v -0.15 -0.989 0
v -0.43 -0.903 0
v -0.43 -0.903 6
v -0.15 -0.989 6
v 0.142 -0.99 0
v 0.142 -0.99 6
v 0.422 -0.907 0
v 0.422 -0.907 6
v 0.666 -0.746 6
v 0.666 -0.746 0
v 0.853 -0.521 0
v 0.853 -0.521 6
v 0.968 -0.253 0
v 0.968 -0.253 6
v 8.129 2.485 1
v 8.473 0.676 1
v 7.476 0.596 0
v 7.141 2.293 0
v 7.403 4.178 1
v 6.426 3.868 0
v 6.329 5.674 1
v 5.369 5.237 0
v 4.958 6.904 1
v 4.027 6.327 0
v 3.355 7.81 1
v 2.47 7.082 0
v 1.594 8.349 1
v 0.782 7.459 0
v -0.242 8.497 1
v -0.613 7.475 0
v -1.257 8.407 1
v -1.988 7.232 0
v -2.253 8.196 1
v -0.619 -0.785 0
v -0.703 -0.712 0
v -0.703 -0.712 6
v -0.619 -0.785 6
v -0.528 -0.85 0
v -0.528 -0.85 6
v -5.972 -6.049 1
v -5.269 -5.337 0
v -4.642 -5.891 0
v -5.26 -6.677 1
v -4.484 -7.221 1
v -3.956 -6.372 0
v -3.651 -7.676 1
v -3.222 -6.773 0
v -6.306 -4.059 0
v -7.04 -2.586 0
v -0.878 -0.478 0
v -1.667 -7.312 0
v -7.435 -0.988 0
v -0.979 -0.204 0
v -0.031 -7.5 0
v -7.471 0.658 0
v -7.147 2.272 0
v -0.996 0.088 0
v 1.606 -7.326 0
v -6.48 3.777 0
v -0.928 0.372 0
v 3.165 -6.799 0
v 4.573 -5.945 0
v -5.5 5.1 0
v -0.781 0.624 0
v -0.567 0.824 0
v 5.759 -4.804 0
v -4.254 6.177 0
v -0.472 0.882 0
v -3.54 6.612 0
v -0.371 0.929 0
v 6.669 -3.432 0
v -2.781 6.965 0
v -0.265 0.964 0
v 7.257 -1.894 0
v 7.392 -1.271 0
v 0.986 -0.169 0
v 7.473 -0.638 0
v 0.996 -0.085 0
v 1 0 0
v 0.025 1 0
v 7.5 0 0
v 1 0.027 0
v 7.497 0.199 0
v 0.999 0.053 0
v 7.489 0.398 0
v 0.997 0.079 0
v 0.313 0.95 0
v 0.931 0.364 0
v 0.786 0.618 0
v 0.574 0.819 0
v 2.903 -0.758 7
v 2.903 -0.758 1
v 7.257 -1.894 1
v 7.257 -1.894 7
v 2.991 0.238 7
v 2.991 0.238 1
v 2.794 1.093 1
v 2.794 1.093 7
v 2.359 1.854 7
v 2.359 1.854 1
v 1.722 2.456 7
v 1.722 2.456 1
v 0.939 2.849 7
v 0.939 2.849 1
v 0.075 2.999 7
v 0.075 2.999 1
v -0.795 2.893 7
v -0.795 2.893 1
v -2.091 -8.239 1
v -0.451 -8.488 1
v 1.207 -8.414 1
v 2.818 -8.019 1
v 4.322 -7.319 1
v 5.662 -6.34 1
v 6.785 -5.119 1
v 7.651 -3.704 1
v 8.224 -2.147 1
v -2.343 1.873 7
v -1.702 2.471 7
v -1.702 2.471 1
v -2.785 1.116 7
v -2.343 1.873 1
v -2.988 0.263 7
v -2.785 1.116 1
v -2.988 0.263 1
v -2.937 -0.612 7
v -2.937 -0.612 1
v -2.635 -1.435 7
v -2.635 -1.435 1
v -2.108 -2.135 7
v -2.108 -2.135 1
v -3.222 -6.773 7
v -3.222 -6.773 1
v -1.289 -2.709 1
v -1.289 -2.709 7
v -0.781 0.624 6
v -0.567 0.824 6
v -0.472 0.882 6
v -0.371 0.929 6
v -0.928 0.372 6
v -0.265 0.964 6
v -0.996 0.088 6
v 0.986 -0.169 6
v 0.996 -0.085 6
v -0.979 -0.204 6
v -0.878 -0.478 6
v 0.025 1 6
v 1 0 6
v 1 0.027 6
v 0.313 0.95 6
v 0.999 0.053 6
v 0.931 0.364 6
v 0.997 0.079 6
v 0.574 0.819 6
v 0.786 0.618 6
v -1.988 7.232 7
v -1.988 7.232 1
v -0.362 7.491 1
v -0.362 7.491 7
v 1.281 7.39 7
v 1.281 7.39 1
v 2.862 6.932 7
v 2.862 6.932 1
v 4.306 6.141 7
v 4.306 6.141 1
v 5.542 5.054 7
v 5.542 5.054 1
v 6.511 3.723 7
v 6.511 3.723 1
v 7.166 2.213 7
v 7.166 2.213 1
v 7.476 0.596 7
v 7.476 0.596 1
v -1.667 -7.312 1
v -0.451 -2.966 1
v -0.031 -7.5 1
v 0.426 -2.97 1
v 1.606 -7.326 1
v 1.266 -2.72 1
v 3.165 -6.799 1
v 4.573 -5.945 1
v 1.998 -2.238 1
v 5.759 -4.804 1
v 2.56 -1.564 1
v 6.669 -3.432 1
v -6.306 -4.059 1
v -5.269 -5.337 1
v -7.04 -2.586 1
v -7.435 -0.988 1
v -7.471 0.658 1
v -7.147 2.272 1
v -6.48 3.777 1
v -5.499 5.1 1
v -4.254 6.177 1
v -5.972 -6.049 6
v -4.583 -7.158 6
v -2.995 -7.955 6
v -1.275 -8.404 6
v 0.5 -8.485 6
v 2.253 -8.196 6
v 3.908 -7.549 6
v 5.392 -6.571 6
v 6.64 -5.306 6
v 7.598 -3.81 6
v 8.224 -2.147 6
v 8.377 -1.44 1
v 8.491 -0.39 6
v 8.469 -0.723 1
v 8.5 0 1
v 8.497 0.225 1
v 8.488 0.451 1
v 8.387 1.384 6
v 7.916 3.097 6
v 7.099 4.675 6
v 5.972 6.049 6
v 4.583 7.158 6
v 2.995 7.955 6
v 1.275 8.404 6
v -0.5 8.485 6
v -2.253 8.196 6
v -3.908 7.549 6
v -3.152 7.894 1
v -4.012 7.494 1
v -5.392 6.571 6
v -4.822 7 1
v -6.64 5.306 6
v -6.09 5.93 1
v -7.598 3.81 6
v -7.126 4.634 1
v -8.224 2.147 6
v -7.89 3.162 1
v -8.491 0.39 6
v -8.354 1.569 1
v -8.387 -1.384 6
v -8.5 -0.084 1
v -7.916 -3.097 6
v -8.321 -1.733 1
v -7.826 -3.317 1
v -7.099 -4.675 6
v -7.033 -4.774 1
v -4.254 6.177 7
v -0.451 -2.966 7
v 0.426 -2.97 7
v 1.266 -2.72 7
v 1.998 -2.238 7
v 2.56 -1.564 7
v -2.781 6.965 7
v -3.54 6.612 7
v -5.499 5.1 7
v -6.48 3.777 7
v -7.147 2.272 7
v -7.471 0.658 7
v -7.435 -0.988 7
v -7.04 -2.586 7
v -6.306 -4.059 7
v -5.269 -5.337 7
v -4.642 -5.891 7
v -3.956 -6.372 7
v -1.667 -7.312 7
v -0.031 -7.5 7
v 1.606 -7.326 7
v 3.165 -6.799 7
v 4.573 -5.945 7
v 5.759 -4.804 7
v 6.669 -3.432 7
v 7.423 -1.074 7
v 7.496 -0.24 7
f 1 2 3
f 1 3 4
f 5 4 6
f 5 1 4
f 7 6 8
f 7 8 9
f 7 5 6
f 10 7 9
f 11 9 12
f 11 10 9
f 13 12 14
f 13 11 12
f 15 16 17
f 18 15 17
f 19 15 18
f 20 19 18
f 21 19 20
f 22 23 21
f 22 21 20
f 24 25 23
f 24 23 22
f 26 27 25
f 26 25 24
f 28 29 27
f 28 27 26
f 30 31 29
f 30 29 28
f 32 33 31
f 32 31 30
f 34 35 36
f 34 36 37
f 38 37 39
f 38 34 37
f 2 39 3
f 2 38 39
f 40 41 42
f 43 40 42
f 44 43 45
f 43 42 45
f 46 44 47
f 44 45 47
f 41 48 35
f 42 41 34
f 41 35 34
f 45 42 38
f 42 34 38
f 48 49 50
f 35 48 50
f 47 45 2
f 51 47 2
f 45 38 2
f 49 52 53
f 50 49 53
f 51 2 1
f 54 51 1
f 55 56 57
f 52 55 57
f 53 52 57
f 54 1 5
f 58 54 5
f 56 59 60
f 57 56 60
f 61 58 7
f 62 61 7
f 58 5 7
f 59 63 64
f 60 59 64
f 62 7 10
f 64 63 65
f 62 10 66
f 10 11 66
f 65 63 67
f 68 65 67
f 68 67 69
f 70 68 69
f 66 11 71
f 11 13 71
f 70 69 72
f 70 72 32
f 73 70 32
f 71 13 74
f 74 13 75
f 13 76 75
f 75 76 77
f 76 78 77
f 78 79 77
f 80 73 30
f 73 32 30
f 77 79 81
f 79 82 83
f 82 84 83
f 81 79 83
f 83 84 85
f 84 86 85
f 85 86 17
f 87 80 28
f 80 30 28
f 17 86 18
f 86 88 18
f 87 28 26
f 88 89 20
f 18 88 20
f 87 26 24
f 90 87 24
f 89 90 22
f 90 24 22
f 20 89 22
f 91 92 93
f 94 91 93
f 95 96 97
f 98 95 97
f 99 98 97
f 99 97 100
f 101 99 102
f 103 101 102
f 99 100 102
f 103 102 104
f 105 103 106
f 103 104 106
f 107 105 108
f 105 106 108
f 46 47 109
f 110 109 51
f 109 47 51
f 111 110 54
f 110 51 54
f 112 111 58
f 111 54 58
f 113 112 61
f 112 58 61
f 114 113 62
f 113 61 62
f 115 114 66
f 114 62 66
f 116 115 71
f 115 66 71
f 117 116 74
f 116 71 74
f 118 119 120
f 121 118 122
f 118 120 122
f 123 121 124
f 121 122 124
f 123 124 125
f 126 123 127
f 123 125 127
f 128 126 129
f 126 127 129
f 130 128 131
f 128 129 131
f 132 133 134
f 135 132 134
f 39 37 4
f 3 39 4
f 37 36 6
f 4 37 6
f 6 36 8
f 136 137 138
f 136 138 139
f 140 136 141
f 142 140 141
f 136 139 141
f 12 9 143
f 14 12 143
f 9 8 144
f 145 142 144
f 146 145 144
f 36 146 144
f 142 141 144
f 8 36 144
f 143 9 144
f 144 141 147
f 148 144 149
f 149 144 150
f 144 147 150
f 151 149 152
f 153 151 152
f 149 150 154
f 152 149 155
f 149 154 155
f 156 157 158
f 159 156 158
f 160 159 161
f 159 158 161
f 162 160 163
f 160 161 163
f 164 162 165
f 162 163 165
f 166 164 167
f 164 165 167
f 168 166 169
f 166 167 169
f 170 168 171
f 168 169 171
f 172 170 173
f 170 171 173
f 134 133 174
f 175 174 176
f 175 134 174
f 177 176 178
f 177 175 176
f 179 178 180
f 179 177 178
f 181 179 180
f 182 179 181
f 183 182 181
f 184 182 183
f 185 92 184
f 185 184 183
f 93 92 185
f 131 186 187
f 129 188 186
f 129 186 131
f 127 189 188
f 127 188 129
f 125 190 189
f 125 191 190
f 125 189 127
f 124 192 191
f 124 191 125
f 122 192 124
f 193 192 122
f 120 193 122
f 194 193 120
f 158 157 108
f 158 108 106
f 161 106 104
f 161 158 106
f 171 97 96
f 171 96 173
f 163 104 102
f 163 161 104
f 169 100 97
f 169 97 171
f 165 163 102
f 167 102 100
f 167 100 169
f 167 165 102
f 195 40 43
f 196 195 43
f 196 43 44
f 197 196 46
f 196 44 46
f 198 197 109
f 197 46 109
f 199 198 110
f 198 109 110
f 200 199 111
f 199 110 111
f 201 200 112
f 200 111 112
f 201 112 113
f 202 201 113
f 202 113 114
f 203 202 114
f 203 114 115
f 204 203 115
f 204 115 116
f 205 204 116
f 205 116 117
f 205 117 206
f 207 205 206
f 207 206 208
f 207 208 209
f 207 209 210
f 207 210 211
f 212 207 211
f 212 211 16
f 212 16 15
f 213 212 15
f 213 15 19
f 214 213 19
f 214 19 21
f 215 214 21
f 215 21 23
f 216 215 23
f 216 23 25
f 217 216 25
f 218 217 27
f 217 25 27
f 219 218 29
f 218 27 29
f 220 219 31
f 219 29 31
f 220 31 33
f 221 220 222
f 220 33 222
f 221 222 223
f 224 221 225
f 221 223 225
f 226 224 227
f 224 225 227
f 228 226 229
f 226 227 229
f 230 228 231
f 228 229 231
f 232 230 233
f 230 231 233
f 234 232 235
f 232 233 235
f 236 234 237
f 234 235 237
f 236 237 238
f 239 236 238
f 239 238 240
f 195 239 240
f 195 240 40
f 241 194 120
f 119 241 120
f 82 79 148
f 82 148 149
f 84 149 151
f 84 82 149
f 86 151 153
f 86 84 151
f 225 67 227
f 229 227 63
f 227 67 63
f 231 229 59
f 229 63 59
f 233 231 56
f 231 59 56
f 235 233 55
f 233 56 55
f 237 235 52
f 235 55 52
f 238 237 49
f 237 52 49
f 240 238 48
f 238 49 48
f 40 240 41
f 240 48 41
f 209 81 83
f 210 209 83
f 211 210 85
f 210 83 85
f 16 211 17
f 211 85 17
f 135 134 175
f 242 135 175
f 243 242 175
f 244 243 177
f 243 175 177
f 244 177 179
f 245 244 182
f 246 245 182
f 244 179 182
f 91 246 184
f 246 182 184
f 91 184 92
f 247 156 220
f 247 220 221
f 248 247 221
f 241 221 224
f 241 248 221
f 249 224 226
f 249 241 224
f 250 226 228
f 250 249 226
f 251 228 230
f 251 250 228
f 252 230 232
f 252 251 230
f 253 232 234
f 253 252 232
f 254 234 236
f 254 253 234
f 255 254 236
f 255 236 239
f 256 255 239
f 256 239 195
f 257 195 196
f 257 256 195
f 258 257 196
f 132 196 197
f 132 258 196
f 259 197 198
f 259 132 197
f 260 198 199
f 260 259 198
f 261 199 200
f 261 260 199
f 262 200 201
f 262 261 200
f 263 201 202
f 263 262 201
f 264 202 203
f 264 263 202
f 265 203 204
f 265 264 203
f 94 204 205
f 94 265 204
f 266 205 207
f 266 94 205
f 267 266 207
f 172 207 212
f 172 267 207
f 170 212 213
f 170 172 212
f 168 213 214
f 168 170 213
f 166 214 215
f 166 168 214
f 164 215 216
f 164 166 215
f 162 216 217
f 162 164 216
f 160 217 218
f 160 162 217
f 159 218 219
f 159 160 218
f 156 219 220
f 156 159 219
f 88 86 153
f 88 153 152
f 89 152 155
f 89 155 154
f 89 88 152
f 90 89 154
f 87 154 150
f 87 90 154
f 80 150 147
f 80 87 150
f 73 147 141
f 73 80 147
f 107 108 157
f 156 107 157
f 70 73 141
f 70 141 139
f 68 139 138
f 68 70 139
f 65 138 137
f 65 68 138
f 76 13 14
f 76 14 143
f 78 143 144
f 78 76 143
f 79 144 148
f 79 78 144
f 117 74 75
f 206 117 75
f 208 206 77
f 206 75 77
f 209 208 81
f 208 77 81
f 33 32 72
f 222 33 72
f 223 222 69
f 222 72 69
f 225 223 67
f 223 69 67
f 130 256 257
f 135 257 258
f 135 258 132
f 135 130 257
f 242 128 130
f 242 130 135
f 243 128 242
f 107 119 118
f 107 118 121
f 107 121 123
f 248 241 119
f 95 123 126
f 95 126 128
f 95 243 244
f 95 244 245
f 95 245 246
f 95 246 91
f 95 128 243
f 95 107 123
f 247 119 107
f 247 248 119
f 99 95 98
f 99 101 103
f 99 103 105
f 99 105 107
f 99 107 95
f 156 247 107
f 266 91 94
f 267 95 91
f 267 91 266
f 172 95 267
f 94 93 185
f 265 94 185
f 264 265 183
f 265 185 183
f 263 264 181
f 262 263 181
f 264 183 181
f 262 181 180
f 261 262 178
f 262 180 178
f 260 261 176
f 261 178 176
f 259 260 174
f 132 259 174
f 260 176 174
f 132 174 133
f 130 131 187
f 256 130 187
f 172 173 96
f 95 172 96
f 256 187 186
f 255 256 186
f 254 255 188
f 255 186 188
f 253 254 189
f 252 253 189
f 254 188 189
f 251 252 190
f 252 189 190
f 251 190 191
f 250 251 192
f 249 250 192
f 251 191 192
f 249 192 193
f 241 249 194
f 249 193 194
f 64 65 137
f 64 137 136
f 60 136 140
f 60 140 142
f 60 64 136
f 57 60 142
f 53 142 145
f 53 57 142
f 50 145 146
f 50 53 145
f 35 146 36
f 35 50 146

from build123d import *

# Parameters (mm, degrees)
F1_DEPTH = 1
F2_DEPTH = 7
F3_DEPTH = 6
F5_SIZE  = 0.99999


# Not quite as in the source:
# - a fillet or chamfer that OpenCascade refuses, or shapes differently, is made with other operations: its cross-section is extruded or revolved along the edge and cut away or added
# - a fillet or chamfer is up to 0.001 mm smaller than in the source, because OpenCascade refuses the exact size


with BuildPart() as f1:
    # F0 (on Top) → F1 (new body)
    with BuildSketch(Plane.XY):
        with BuildLine():
            ThreePointArc((-3.2217815715, -6.7727485931), (3.1654449772, -6.7992615846), (7.2568170006, -1.8943619029))
            Line((7.2568170006, -1.8943619029), (2.9027268003, -0.7577447612))
            ThreePointArc((2.9027268003, -0.7577447612), (1.2661779909, -2.7197046339), (-1.2887126286, -2.7090994373))
            Line((-1.2887126286, -2.7090994373), (-3.2217815715, -6.7727485931))
        make_face()
        with BuildLine():
            Line((-1.7017926197, 2.4706075932), (-4.2544815494, 6.1765189829))
            ThreePointArc((-4.2544815494, 6.1765189829), (-7.4710557479, 0.6582750278), (-5.2689740322, -5.3374069217))
            Line((-5.2689740322, -5.3374069217), (-2.1075896129, -2.1349627687))
            ThreePointArc((-2.1075896129, -2.1349627687), (-2.9884222991, 0.2633100111), (-1.7017926197, 2.4706075932))
        make_face()
        with BuildLine():
            ThreePointArc((3, 0), (2.9976253723, 0.119340385), (2.9905052483, 0.2384918441))
            Line((2.9905052483, 0.2384918441), (0.9968350828, 0.0794972814))
            ThreePointArc((0.9968350828, 0.0794972814), (0.9992084574, 0.0397801283), (1, 0))
            ThreePointArc((1, 0), (0.9918607765, -0.1273271376), (0.9675756001, -0.2525815871))
            Line((0.9675756001, -0.2525815871), (2.9027268003, -0.7577447612))
            ThreePointArc((2.9027268003, -0.7577447612), (2.9755823296, -0.3819814127), (3, 0))
        make_face()
        with BuildLine():
            Line((-0.7951371874, 2.8927075298), (-1.9878429685, 7.2317688246))
            ThreePointArc((-1.9878429685, 7.2317688246), (-3.1654449772, 6.7992615846), (-4.2544815494, 6.1765189829))
            Line((-4.2544815494, 6.1765189829), (-1.7017926197, 2.4706075932))
            ThreePointArc((-1.7017926197, 2.4706075932), (-1.2661779909, 2.7197046339), (-0.7951371874, 2.8927075298))
        make_face()
        with BuildLine():
            ThreePointArc((-5.2689740322, -5.3374069217), (-4.3056107707, -6.1409865568), (-3.2217815715, -6.7727485931))
            Line((-3.2217815715, -6.7727485931), (-1.2887126286, -2.7090994373))
            ThreePointArc((-1.2887126286, -2.7090994373), (-1.7222443083, -2.4563946227), (-2.1075896129, -2.1349627687))
            Line((-2.1075896129, -2.1349627687), (-5.2689740322, -5.3374069217))
        make_face()
        with BuildLine():
            ThreePointArc((-2.1075896129, -2.1349627687), (-1.7222443083, -2.4563946227), (-1.2887126286, -2.7090994373))
            Line((-1.2887126286, -2.7090994373), (-0.4295708762, -0.9030331458))
            ThreePointArc((-0.4295708762, -0.9030331458), (-0.5740814361, -0.8187982076), (-0.702529871, -0.7116542562))
            Line((-0.702529871, -0.7116542562), (-2.1075896129, -2.1349627687))
        make_face()
        with BuildLine():
            Line((-0.2650457291, 0.9642358433), (-0.7951371874, 2.8927075298))
            ThreePointArc((-0.7951371874, 2.8927075298), (-1.2661779909, 2.7197046339), (-1.7017926197, 2.4706075932))
            Line((-1.7017926197, 2.4706075932), (-0.5672642066, 0.8235358644))
            ThreePointArc((-0.5672642066, 0.8235358644), (-0.4220593303, 0.9065682113), (-0.2650457291, 0.9642358433))
        make_face()
        with BuildLine():
            ThreePointArc((-1.2887126286, -2.7090994373), (1.2661779909, -2.7197046339), (2.9027268003, -0.7577447612))
            Line((2.9027268003, -0.7577447612), (0.9675756001, -0.2525815871))
            ThreePointArc((0.9675756001, -0.2525815871), (0.4220593303, -0.9065682113), (-0.4295708762, -0.9030331458))
            Line((-0.4295708762, -0.9030331458), (-1.2887126286, -2.7090994373))
        make_face()
        with BuildLine():
            Line((-0.5672642066, 0.8235358644), (-1.7017926197, 2.4706075932))
            ThreePointArc((-1.7017926197, 2.4706075932), (-2.9884222991, 0.2633100111), (-2.1075896129, -2.1349627687))
            Line((-2.1075896129, -2.1349627687), (-0.702529871, -0.7116542562))
            ThreePointArc((-0.702529871, -0.7116542562), (-0.9961407664, 0.0877700037), (-0.5672642066, 0.8235358644))
        make_face()
        with BuildLine():
            Line((2.9905052483, 0.2384918441), (7.4762631208, 0.5962296102))
            ThreePointArc((7.4762631208, 0.5962296102), (4.3056107707, 6.1409865568), (-1.9878429685, 7.2317688246))
            Line((-1.9878429685, 7.2317688246), (-0.7951371874, 2.8927075298))
            ThreePointArc((-0.7951371874, 2.8927075298), (1.7222443083, 2.4563946227), (2.9905052483, 0.2384918441))
        make_face()
        with BuildLine():
            Line((0.9968350828, 0.0794972814), (2.9905052483, 0.2384918441))
            ThreePointArc((2.9905052483, 0.2384918441), (1.7222443083, 2.4563946227), (-0.7951371874, 2.8927075298))
            Line((-0.7951371874, 2.8927075298), (-0.2650457291, 0.9642358433))
            ThreePointArc((-0.2650457291, 0.9642358433), (0.5740814361, 0.8187982076), (0.9968350828, 0.0794972814))
        make_face()
        with BuildLine():
            ThreePointArc((7.5, 0), (7.4940634307, 0.2983509626), (7.4762631208, 0.5962296102))
            Line((7.4762631208, 0.5962296102), (2.9905052483, 0.2384918441))
            ThreePointArc((2.9905052483, 0.2384918441), (2.9976253723, 0.119340385), (3, 0))
            ThreePointArc((3, 0), (2.9755823296, -0.3819814127), (2.9027268003, -0.7577447612))
            Line((2.9027268003, -0.7577447612), (7.2568170006, -1.8943619029))
            ThreePointArc((7.2568170006, -1.8943619029), (7.4389558241, -0.9549535316), (7.5, 0))
        make_face()
        with BuildLine():
            Line((7.4762631208, 0.5962296102), (8.4730982036, 0.6757268916))
            ThreePointArc((8.4730982036, 0.6757268916), (4.8796922068, 6.9597847644), (-2.2528886976, 8.1960046679))
            Line((-2.2528886976, 8.1960046679), (-1.9878429685, 7.2317688246))
            ThreePointArc((-1.9878429685, 7.2317688246), (4.3056107707, 6.1409865568), (7.4762631208, 0.5962296102))
        make_face()
        with BuildLine():
            Line((-1.9878429685, 7.2317688246), (-2.2528886976, 8.1960046679))
            ThreePointArc((-2.2528886976, 8.1960046679), (-3.5875043075, 7.7058297959), (-4.821745756, 7.0000548473))
            Line((-4.821745756, 7.0000548473), (-4.2544815494, 6.1765189829))
            ThreePointArc((-4.2544815494, 6.1765189829), (-3.1654449772, 6.7992615846), (-1.9878429685, 7.2317688246))
        make_face()
        with BuildLine():
            Line((-4.2544815494, 6.1765189829), (-4.821745756, 7.0000548473))
            ThreePointArc((-4.821745756, 7.0000548473), (-8.4671965143, 0.7460450315), (-5.9715039032, -6.049061178))
            Line((-5.9715039032, -6.049061178), (-5.2689740322, -5.3374069217))
            ThreePointArc((-5.2689740322, -5.3374069217), (-7.4710557479, 0.6582750278), (-4.2544815494, 6.1765189829))
        make_face()
        with BuildLine():
            ThreePointArc((-5.9715039032, -6.049061178), (-4.8796922068, -6.9597847644), (-3.6513524477, -7.6757817389))
            Line((-3.6513524477, -7.6757817389), (-3.2217815715, -6.7727485931))
            ThreePointArc((-3.2217815715, -6.7727485931), (-4.3056107707, -6.1409865568), (-5.2689740322, -5.3374069217))
            Line((-5.2689740322, -5.3374069217), (-5.9715039032, -6.049061178))
        make_face()
        with BuildLine():
            ThreePointArc((-3.6513524477, -7.6757817389), (3.5875043075, -7.7058297959), (8.2243926007, -2.14694349))
            Line((8.2243926007, -2.14694349), (7.2568170006, -1.8943619029))
            ThreePointArc((7.2568170006, -1.8943619029), (3.1654449772, -6.7992615846), (-3.2217815715, -6.7727485931))
            Line((-3.2217815715, -6.7727485931), (-3.6513524477, -7.6757817389))
        make_face()
        with BuildLine():
            ThreePointArc((8.2243926007, -2.14694349), (8.4308166006, -1.0822806692), (8.5, 0))
            ThreePointArc((8.5, 0), (8.4932718881, 0.338131091), (8.4730982036, 0.6757268916))
            Line((8.4730982036, 0.6757268916), (7.4762631208, 0.5962296102))
            ThreePointArc((7.4762631208, 0.5962296102), (7.4940634307, 0.2983509626), (7.5, 0))
            ThreePointArc((7.5, 0), (7.4389558241, -0.9549535316), (7.2568170006, -1.8943619029))
            Line((7.2568170006, -1.8943619029), (8.2243926007, -2.14694349))
        make_face()
    extrude(amount=F1_DEPTH)

    # F0 (on Top) → F2 (join)
    with BuildSketch(Plane.XY):
        with BuildLine():
            Line((-4.2544815494, 6.1765189829), (-4.821745756, 7.0000548473))
            ThreePointArc((-4.821745756, 7.0000548473), (-8.4671965143, 0.7460450315), (-5.9715039032, -6.049061178))
            Line((-5.9715039032, -6.049061178), (-5.2689740322, -5.3374069217))
            ThreePointArc((-5.2689740322, -5.3374069217), (-7.4710557479, 0.6582750278), (-4.2544815494, 6.1765189829))
        make_face()
        with BuildLine():
            ThreePointArc((-5.9715039032, -6.049061178), (-4.8796922068, -6.9597847644), (-3.6513524477, -7.6757817389))
            Line((-3.6513524477, -7.6757817389), (-3.2217815715, -6.7727485931))
            ThreePointArc((-3.2217815715, -6.7727485931), (-4.3056107707, -6.1409865568), (-5.2689740322, -5.3374069217))
            Line((-5.2689740322, -5.3374069217), (-5.9715039032, -6.049061178))
        make_face()
        with BuildLine():
            ThreePointArc((-3.6513524477, -7.6757817389), (3.5875043075, -7.7058297959), (8.2243926007, -2.14694349))
            Line((8.2243926007, -2.14694349), (7.2568170006, -1.8943619029))
            ThreePointArc((7.2568170006, -1.8943619029), (3.1654449772, -6.7992615846), (-3.2217815715, -6.7727485931))
            Line((-3.2217815715, -6.7727485931), (-3.6513524477, -7.6757817389))
        make_face()
        with BuildLine():
            ThreePointArc((8.2243926007, -2.14694349), (8.4308166006, -1.0822806692), (8.5, 0))
            ThreePointArc((8.5, 0), (8.4932718881, 0.338131091), (8.4730982036, 0.6757268916))
            Line((8.4730982036, 0.6757268916), (7.4762631208, 0.5962296102))
            ThreePointArc((7.4762631208, 0.5962296102), (7.4940634307, 0.2983509626), (7.5, 0))
            ThreePointArc((7.5, 0), (7.4389558241, -0.9549535316), (7.2568170006, -1.8943619029))
            Line((7.2568170006, -1.8943619029), (8.2243926007, -2.14694349))
        make_face()
        with BuildLine():
            Line((7.4762631208, 0.5962296102), (8.4730982036, 0.6757268916))
            ThreePointArc((8.4730982036, 0.6757268916), (4.8796922068, 6.9597847644), (-2.2528886976, 8.1960046679))
            Line((-2.2528886976, 8.1960046679), (-1.9878429685, 7.2317688246))
            ThreePointArc((-1.9878429685, 7.2317688246), (4.3056107707, 6.1409865568), (7.4762631208, 0.5962296102))
        make_face()
        with BuildLine():
            Line((-1.9878429685, 7.2317688246), (-2.2528886976, 8.1960046679))
            ThreePointArc((-2.2528886976, 8.1960046679), (-3.5875043075, 7.7058297959), (-4.821745756, 7.0000548473))
            Line((-4.821745756, 7.0000548473), (-4.2544815494, 6.1765189829))
            ThreePointArc((-4.2544815494, 6.1765189829), (-3.1654449772, 6.7992615846), (-1.9878429685, 7.2317688246))
        make_face()
        with BuildLine():
            Line((-0.2650457291, 0.9642358433), (-0.7951371874, 2.8927075298))
            ThreePointArc((-0.7951371874, 2.8927075298), (-1.2661779909, 2.7197046339), (-1.7017926197, 2.4706075932))
            Line((-1.7017926197, 2.4706075932), (-0.5672642066, 0.8235358644))
            ThreePointArc((-0.5672642066, 0.8235358644), (-0.4220593303, 0.9065682113), (-0.2650457291, 0.9642358433))
        make_face()
        with BuildLine():
            Line((-0.5672642066, 0.8235358644), (-1.7017926197, 2.4706075932))
            ThreePointArc((-1.7017926197, 2.4706075932), (-2.9884222991, 0.2633100111), (-2.1075896129, -2.1349627687))
            Line((-2.1075896129, -2.1349627687), (-0.702529871, -0.7116542562))
            ThreePointArc((-0.702529871, -0.7116542562), (-0.9961407664, 0.0877700037), (-0.5672642066, 0.8235358644))
        make_face()
        with BuildLine():
            ThreePointArc((-2.1075896129, -2.1349627687), (-1.7222443083, -2.4563946227), (-1.2887126286, -2.7090994373))
            Line((-1.2887126286, -2.7090994373), (-0.4295708762, -0.9030331458))
            ThreePointArc((-0.4295708762, -0.9030331458), (-0.5740814361, -0.8187982076), (-0.702529871, -0.7116542562))
            Line((-0.702529871, -0.7116542562), (-2.1075896129, -2.1349627687))
        make_face()
        with BuildLine():
            ThreePointArc((-1.2887126286, -2.7090994373), (1.2661779909, -2.7197046339), (2.9027268003, -0.7577447612))
            Line((2.9027268003, -0.7577447612), (0.9675756001, -0.2525815871))
            ThreePointArc((0.9675756001, -0.2525815871), (0.4220593303, -0.9065682113), (-0.4295708762, -0.9030331458))
            Line((-0.4295708762, -0.9030331458), (-1.2887126286, -2.7090994373))
        make_face()
        with BuildLine():
            ThreePointArc((3, 0), (2.9976253723, 0.119340385), (2.9905052483, 0.2384918441))
            Line((2.9905052483, 0.2384918441), (0.9968350828, 0.0794972814))
            ThreePointArc((0.9968350828, 0.0794972814), (0.9992084574, 0.0397801283), (1, 0))
            ThreePointArc((1, 0), (0.9918607765, -0.1273271376), (0.9675756001, -0.2525815871))
            Line((0.9675756001, -0.2525815871), (2.9027268003, -0.7577447612))
            ThreePointArc((2.9027268003, -0.7577447612), (2.9755823296, -0.3819814127), (3, 0))
        make_face()
        with BuildLine():
            Line((0.9968350828, 0.0794972814), (2.9905052483, 0.2384918441))
            ThreePointArc((2.9905052483, 0.2384918441), (1.7222443083, 2.4563946227), (-0.7951371874, 2.8927075298))
            Line((-0.7951371874, 2.8927075298), (-0.2650457291, 0.9642358433))
            ThreePointArc((-0.2650457291, 0.9642358433), (0.5740814361, 0.8187982076), (0.9968350828, 0.0794972814))
        make_face()
        with BuildLine():
            Line((-0.7951371874, 2.8927075298), (-1.9878429685, 7.2317688246))
            ThreePointArc((-1.9878429685, 7.2317688246), (-3.1654449772, 6.7992615846), (-4.2544815494, 6.1765189829))
            Line((-4.2544815494, 6.1765189829), (-1.7017926197, 2.4706075932))
            ThreePointArc((-1.7017926197, 2.4706075932), (-1.2661779909, 2.7197046339), (-0.7951371874, 2.8927075298))
        make_face()
        with BuildLine():
            ThreePointArc((-5.2689740322, -5.3374069217), (-4.3056107707, -6.1409865568), (-3.2217815715, -6.7727485931))
            Line((-3.2217815715, -6.7727485931), (-1.2887126286, -2.7090994373))
            ThreePointArc((-1.2887126286, -2.7090994373), (-1.7222443083, -2.4563946227), (-2.1075896129, -2.1349627687))
            Line((-2.1075896129, -2.1349627687), (-5.2689740322, -5.3374069217))
        make_face()
        with BuildLine():
            ThreePointArc((7.5, 0), (7.4940634307, 0.2983509626), (7.4762631208, 0.5962296102))
            Line((7.4762631208, 0.5962296102), (2.9905052483, 0.2384918441))
            ThreePointArc((2.9905052483, 0.2384918441), (2.9976253723, 0.119340385), (3, 0))
            ThreePointArc((3, 0), (2.9755823296, -0.3819814127), (2.9027268003, -0.7577447612))
            Line((2.9027268003, -0.7577447612), (7.2568170006, -1.8943619029))
            ThreePointArc((7.2568170006, -1.8943619029), (7.4389558241, -0.9549535316), (7.5, 0))
        make_face()
        with BuildLine():
            Line((0, 0), (-0.2650457291, 0.9642358433))
            ThreePointArc((-0.2650457291, 0.9642358433), (-0.4220593303, 0.9065682113), (-0.5672642066, 0.8235358644))
            Line((-0.5672642066, 0.8235358644), (0, 0))
        make_face()
        with BuildLine():
            Line((-0.702529871, -0.7116542562), (0, 0))
            Line((0, 0), (-0.5672642066, 0.8235358644))
            ThreePointArc((-0.5672642066, 0.8235358644), (-0.9961407664, 0.0877700037), (-0.702529871, -0.7116542562))
        make_face()
        with BuildLine():
            Line((-0.4295708762, -0.9030331458), (0, 0))
            Line((0, 0), (-0.702529871, -0.7116542562))
            ThreePointArc((-0.702529871, -0.7116542562), (-0.5740814361, -0.8187982076), (-0.4295708762, -0.9030331458))
        make_face()
        with BuildLine():
            ThreePointArc((-0.4295708762, -0.9030331458), (0.4220593303, -0.9065682113), (0.9675756001, -0.2525815871))
            Line((0.9675756001, -0.2525815871), (0, 0))
            Line((0, 0), (-0.4295708762, -0.9030331458))
        make_face()
        with BuildLine():
            ThreePointArc((1, 0), (0.9992084574, 0.0397801283), (0.9968350828, 0.0794972814))
            Line((0.9968350828, 0.0794972814), (0, 0))
            Line((0, 0), (0.9675756001, -0.2525815871))
            ThreePointArc((0.9675756001, -0.2525815871), (0.9918607765, -0.1273271376), (1, 0))
        make_face()
        with BuildLine():
            Line((0, 0), (0.9968350828, 0.0794972814))
            ThreePointArc((0.9968350828, 0.0794972814), (0.5740814361, 0.8187982076), (-0.2650457291, 0.9642358433))
            Line((-0.2650457291, 0.9642358433), (0, 0))
        make_face()
    extrude(amount=F2_DEPTH)

    # F0 (on Top) → F3 (cut)
    with BuildSketch(Plane.XY):
        with BuildLine():
            ThreePointArc((-0.4295708762, -0.9030331458), (0.4220593303, -0.9065682113), (0.9675756001, -0.2525815871))
            Line((0.9675756001, -0.2525815871), (0, 0))
            Line((0, 0), (-0.4295708762, -0.9030331458))
        make_face()
        with BuildLine():
            ThreePointArc((1, 0), (0.9992084574, 0.0397801283), (0.9968350828, 0.0794972814))
            Line((0.9968350828, 0.0794972814), (0, 0))
            Line((0, 0), (0.9675756001, -0.2525815871))
            ThreePointArc((0.9675756001, -0.2525815871), (0.9918607765, -0.1273271376), (1, 0))
        make_face()
        with BuildLine():
            Line((0, 0), (0.9968350828, 0.0794972814))
            ThreePointArc((0.9968350828, 0.0794972814), (0.5740814361, 0.8187982076), (-0.2650457291, 0.9642358433))
            Line((-0.2650457291, 0.9642358433), (0, 0))
        make_face()
        with BuildLine():
            Line((-0.702529871, -0.7116542562), (0, 0))
            Line((0, 0), (-0.5672642066, 0.8235358644))
            ThreePointArc((-0.5672642066, 0.8235358644), (-0.9961407664, 0.0877700037), (-0.702529871, -0.7116542562))
        make_face()
        with BuildLine():
            Line((-0.4295708762, -0.9030331458), (0, 0))
            Line((0, 0), (-0.702529871, -0.7116542562))
            ThreePointArc((-0.702529871, -0.7116542562), (-0.5740814361, -0.8187982076), (-0.4295708762, -0.9030331458))
        make_face()
        with BuildLine():
            Line((0, 0), (-0.2650457291, 0.9642358433))
            ThreePointArc((-0.2650457291, 0.9642358433), (-0.4220593303, 0.9065682113), (-0.5672642066, 0.8235358644))
            Line((-0.5672642066, 0.8235358644), (0, 0))
        make_face()
    extrude(amount=F3_DEPTH, mode=Mode.SUBTRACT)

    # F4: chamfer of 1 on 1 edges, made by hand

    # F4_s1 → F4_t2 (revolve, cut)
    with BuildSketch(Plane(origin=(0, 0, 0), x_dir=(0, 0, 1), z_dir=(0.9642358433, 0.2650457291, 0))):
        Polygon((6, -8.5), (7, -7.5), (7, -8.5), align=None)
    revolve(axis=Axis((0, 0, 7), (0, 0, 1)), mode=Mode.SUBTRACT)

    # F5 (size 1 in the source; OpenCascade refuses exactly that, so slightly less here)
    f5_edges = [f1.edges().sort_by_distance(p)[0] for p in [
        (-8.224393, 2.146943, 0),
    ]]
    chamfer(f5_edges, length=F5_SIZE)


solid = f1.part
